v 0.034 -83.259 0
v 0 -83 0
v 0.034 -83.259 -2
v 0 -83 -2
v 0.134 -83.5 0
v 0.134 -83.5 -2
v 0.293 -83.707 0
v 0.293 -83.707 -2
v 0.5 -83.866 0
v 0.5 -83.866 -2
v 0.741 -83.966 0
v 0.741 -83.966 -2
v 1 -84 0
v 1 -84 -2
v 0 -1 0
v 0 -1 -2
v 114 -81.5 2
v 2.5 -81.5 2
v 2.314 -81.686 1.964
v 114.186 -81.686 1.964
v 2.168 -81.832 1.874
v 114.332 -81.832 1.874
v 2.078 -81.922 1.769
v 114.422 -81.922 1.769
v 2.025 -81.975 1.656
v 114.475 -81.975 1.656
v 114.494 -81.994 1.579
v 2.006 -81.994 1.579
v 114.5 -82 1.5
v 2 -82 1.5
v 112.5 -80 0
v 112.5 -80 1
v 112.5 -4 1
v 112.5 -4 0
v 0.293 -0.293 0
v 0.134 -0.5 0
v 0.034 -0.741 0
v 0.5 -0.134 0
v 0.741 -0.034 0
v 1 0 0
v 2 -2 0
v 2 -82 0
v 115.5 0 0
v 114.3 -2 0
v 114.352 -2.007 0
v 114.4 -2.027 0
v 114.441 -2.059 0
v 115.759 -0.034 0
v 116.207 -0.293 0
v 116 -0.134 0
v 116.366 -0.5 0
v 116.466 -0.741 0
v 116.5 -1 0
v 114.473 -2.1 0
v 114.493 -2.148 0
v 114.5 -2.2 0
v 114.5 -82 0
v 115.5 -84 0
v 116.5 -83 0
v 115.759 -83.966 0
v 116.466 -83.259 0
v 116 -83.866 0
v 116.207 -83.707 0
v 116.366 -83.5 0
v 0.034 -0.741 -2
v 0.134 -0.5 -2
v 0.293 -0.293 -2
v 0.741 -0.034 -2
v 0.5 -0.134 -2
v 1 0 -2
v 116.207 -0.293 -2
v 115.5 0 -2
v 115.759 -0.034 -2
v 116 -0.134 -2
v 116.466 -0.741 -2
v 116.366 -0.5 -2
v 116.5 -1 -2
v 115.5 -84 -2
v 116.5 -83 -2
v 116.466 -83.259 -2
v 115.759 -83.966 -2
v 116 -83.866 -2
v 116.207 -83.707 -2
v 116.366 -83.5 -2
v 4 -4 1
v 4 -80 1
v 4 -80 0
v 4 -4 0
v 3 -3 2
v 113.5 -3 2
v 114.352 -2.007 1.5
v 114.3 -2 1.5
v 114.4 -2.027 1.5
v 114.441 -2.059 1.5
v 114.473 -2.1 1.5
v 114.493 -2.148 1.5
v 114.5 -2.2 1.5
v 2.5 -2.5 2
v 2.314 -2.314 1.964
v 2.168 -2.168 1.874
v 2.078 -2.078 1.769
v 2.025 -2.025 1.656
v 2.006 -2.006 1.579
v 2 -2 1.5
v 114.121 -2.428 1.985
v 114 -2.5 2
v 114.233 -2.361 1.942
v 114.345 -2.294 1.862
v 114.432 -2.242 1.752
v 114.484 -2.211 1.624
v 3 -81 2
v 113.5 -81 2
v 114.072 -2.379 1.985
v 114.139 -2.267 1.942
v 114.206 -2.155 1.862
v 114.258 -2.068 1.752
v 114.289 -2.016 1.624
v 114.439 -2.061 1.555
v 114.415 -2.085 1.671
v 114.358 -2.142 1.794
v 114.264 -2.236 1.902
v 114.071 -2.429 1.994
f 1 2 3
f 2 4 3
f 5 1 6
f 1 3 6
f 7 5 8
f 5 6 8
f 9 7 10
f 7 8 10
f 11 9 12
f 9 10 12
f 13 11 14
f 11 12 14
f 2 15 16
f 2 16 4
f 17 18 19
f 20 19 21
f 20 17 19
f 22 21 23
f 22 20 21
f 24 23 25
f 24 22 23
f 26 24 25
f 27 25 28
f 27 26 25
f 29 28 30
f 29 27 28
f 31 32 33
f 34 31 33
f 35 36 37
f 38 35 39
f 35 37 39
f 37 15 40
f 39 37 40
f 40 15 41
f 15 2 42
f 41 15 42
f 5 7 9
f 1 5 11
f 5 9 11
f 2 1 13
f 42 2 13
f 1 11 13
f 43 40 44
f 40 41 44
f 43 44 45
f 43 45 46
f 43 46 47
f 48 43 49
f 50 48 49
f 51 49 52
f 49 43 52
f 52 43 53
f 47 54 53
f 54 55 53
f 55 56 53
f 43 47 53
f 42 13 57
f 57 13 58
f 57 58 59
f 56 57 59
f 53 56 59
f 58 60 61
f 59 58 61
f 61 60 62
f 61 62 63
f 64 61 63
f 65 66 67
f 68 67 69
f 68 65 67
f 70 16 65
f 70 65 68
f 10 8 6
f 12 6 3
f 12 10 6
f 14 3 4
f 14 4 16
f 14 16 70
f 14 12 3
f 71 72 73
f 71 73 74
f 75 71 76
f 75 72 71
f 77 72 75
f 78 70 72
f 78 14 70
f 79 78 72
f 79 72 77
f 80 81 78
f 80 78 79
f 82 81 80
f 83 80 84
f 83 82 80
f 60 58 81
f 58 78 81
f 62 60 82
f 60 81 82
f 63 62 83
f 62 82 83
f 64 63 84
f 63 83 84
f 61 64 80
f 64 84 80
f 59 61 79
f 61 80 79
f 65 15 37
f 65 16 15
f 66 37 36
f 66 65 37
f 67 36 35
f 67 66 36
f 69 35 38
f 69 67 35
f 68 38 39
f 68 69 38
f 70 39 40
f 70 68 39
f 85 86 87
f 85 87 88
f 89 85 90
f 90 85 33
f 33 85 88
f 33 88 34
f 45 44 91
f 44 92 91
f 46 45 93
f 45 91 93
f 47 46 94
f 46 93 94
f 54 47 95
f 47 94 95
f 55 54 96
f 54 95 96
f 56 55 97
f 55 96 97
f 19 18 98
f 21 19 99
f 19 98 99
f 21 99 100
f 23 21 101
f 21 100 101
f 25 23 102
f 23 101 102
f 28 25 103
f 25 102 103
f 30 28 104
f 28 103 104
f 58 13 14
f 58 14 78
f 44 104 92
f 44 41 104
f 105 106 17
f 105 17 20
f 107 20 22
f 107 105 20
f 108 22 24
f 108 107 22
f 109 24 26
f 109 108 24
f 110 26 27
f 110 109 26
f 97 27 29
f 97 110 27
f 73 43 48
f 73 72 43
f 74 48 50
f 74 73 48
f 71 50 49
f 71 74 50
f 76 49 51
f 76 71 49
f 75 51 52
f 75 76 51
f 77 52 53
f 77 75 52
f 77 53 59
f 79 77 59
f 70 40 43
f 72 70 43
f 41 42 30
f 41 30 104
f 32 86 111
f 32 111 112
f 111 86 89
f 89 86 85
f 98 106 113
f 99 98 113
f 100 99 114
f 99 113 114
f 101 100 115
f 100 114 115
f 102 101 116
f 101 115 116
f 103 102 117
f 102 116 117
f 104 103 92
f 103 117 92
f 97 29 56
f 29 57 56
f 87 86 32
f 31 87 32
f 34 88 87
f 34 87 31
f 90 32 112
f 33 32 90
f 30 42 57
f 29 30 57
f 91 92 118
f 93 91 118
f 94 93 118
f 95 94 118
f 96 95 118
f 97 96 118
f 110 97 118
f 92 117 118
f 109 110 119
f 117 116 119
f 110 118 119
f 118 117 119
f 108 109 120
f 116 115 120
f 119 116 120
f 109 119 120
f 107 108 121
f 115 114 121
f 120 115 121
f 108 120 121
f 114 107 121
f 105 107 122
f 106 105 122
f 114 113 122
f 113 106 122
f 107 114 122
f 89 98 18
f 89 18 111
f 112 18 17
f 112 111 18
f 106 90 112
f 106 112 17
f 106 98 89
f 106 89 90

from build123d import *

# Parameters (mm, degrees)
SKETCH007_W     = 116.5
SKETCH007_H     = 84
PAD002_DEPTH    = 2
SKETCH008_W     = 112.5
SKETCH008_H     = 80
PAD003_DEPTH    = 2
SKETCH009_W     = 108.5
SKETCH009_H     = 76
POCKET004_DEPTH = 2
CHAMFER004_SIZE = 1
FILLET002_R     = 0.5
FILLET003_R     = 1
FILLET004_R     = 1
FILLET005_R     = 1
FILLET006_R     = 1
FILLET007_R     = 0.2


with BuildPart() as part:
    # Sketch007 → Pad002 (new body)
    with BuildSketch(Plane(origin=(0, 0, 0), x_dir=(1, 0, 0), z_dir=(0, 0, -1))):
        with Locations((58.25, 42)):
            Rectangle(SKETCH007_W, SKETCH007_H)
    extrude(amount=PAD002_DEPTH)

    # Sketch008 (on Face5 of Pad002) → Pad003 (new body)
    with BuildSketch(Plane.XY):
        with Locations((58.25, -42)):
            Rectangle(SKETCH008_W, SKETCH008_H)
    extrude(amount=PAD003_DEPTH)

    # Sketch009 (on Face11 of Pad003) → Pocket004 (cut)
    with BuildSketch(Plane.XY.offset(2)):
        with Locations((58.25, -42)):
            Rectangle(SKETCH009_W, SKETCH009_H)
    extrude(amount=-POCKET004_DEPTH, mode=Mode.SUBTRACT)

    # Chamfer004
    chamfer004_edges = [part.edges().sort_by_distance(p)[0] for p in [
        (112.5, -42, 2),
        (58.25, -4, 2),
        (4, -42, 2),
        (58.25, -80, 2),
    ]]
    chamfer(chamfer004_edges, length=CHAMFER004_SIZE)

    # Fillet002
    fillet002_edges = [part.edges().sort_by_distance(p)[0] for p in [
        (58.25, -2, 2),
        (2, -42, 2),
        (114.5, -42, 2),
        (58.25, -82, 2),
    ]]
    fillet(fillet002_edges, radius=FILLET002_R)

    # Fillet003
    fillet003_edges = [part.edges().sort_by_distance(p)[0] for p in [
        (0, 0, -1),
    ]]
    fillet(fillet003_edges, radius=FILLET003_R)

    # Fillet004
    fillet004_edges = [part.edges().sort_by_distance(p)[0] for p in [
        (116.5, 0, -1),
    ]]
    fillet(fillet004_edges, radius=FILLET004_R)

    # Fillet005
    fillet005_edges = [part.edges().sort_by_distance(p)[0] for p in [
        (0, -84, -1),
    ]]
    fillet(fillet005_edges, radius=FILLET005_R)

    # Fillet006
    fillet006_edges = [part.edges().sort_by_distance(p)[0] for p in [
        (116.5, -84, -1),
    ]]
    fillet(fillet006_edges, radius=FILLET006_R)

    # Fillet007
    fillet007_edges = [part.edges().sort_by_distance(p)[0] for p in [
        (114.5, -2, 0.75),
    ]]
    fillet(fillet007_edges, radius=FILLET007_R)


solid = part.part
